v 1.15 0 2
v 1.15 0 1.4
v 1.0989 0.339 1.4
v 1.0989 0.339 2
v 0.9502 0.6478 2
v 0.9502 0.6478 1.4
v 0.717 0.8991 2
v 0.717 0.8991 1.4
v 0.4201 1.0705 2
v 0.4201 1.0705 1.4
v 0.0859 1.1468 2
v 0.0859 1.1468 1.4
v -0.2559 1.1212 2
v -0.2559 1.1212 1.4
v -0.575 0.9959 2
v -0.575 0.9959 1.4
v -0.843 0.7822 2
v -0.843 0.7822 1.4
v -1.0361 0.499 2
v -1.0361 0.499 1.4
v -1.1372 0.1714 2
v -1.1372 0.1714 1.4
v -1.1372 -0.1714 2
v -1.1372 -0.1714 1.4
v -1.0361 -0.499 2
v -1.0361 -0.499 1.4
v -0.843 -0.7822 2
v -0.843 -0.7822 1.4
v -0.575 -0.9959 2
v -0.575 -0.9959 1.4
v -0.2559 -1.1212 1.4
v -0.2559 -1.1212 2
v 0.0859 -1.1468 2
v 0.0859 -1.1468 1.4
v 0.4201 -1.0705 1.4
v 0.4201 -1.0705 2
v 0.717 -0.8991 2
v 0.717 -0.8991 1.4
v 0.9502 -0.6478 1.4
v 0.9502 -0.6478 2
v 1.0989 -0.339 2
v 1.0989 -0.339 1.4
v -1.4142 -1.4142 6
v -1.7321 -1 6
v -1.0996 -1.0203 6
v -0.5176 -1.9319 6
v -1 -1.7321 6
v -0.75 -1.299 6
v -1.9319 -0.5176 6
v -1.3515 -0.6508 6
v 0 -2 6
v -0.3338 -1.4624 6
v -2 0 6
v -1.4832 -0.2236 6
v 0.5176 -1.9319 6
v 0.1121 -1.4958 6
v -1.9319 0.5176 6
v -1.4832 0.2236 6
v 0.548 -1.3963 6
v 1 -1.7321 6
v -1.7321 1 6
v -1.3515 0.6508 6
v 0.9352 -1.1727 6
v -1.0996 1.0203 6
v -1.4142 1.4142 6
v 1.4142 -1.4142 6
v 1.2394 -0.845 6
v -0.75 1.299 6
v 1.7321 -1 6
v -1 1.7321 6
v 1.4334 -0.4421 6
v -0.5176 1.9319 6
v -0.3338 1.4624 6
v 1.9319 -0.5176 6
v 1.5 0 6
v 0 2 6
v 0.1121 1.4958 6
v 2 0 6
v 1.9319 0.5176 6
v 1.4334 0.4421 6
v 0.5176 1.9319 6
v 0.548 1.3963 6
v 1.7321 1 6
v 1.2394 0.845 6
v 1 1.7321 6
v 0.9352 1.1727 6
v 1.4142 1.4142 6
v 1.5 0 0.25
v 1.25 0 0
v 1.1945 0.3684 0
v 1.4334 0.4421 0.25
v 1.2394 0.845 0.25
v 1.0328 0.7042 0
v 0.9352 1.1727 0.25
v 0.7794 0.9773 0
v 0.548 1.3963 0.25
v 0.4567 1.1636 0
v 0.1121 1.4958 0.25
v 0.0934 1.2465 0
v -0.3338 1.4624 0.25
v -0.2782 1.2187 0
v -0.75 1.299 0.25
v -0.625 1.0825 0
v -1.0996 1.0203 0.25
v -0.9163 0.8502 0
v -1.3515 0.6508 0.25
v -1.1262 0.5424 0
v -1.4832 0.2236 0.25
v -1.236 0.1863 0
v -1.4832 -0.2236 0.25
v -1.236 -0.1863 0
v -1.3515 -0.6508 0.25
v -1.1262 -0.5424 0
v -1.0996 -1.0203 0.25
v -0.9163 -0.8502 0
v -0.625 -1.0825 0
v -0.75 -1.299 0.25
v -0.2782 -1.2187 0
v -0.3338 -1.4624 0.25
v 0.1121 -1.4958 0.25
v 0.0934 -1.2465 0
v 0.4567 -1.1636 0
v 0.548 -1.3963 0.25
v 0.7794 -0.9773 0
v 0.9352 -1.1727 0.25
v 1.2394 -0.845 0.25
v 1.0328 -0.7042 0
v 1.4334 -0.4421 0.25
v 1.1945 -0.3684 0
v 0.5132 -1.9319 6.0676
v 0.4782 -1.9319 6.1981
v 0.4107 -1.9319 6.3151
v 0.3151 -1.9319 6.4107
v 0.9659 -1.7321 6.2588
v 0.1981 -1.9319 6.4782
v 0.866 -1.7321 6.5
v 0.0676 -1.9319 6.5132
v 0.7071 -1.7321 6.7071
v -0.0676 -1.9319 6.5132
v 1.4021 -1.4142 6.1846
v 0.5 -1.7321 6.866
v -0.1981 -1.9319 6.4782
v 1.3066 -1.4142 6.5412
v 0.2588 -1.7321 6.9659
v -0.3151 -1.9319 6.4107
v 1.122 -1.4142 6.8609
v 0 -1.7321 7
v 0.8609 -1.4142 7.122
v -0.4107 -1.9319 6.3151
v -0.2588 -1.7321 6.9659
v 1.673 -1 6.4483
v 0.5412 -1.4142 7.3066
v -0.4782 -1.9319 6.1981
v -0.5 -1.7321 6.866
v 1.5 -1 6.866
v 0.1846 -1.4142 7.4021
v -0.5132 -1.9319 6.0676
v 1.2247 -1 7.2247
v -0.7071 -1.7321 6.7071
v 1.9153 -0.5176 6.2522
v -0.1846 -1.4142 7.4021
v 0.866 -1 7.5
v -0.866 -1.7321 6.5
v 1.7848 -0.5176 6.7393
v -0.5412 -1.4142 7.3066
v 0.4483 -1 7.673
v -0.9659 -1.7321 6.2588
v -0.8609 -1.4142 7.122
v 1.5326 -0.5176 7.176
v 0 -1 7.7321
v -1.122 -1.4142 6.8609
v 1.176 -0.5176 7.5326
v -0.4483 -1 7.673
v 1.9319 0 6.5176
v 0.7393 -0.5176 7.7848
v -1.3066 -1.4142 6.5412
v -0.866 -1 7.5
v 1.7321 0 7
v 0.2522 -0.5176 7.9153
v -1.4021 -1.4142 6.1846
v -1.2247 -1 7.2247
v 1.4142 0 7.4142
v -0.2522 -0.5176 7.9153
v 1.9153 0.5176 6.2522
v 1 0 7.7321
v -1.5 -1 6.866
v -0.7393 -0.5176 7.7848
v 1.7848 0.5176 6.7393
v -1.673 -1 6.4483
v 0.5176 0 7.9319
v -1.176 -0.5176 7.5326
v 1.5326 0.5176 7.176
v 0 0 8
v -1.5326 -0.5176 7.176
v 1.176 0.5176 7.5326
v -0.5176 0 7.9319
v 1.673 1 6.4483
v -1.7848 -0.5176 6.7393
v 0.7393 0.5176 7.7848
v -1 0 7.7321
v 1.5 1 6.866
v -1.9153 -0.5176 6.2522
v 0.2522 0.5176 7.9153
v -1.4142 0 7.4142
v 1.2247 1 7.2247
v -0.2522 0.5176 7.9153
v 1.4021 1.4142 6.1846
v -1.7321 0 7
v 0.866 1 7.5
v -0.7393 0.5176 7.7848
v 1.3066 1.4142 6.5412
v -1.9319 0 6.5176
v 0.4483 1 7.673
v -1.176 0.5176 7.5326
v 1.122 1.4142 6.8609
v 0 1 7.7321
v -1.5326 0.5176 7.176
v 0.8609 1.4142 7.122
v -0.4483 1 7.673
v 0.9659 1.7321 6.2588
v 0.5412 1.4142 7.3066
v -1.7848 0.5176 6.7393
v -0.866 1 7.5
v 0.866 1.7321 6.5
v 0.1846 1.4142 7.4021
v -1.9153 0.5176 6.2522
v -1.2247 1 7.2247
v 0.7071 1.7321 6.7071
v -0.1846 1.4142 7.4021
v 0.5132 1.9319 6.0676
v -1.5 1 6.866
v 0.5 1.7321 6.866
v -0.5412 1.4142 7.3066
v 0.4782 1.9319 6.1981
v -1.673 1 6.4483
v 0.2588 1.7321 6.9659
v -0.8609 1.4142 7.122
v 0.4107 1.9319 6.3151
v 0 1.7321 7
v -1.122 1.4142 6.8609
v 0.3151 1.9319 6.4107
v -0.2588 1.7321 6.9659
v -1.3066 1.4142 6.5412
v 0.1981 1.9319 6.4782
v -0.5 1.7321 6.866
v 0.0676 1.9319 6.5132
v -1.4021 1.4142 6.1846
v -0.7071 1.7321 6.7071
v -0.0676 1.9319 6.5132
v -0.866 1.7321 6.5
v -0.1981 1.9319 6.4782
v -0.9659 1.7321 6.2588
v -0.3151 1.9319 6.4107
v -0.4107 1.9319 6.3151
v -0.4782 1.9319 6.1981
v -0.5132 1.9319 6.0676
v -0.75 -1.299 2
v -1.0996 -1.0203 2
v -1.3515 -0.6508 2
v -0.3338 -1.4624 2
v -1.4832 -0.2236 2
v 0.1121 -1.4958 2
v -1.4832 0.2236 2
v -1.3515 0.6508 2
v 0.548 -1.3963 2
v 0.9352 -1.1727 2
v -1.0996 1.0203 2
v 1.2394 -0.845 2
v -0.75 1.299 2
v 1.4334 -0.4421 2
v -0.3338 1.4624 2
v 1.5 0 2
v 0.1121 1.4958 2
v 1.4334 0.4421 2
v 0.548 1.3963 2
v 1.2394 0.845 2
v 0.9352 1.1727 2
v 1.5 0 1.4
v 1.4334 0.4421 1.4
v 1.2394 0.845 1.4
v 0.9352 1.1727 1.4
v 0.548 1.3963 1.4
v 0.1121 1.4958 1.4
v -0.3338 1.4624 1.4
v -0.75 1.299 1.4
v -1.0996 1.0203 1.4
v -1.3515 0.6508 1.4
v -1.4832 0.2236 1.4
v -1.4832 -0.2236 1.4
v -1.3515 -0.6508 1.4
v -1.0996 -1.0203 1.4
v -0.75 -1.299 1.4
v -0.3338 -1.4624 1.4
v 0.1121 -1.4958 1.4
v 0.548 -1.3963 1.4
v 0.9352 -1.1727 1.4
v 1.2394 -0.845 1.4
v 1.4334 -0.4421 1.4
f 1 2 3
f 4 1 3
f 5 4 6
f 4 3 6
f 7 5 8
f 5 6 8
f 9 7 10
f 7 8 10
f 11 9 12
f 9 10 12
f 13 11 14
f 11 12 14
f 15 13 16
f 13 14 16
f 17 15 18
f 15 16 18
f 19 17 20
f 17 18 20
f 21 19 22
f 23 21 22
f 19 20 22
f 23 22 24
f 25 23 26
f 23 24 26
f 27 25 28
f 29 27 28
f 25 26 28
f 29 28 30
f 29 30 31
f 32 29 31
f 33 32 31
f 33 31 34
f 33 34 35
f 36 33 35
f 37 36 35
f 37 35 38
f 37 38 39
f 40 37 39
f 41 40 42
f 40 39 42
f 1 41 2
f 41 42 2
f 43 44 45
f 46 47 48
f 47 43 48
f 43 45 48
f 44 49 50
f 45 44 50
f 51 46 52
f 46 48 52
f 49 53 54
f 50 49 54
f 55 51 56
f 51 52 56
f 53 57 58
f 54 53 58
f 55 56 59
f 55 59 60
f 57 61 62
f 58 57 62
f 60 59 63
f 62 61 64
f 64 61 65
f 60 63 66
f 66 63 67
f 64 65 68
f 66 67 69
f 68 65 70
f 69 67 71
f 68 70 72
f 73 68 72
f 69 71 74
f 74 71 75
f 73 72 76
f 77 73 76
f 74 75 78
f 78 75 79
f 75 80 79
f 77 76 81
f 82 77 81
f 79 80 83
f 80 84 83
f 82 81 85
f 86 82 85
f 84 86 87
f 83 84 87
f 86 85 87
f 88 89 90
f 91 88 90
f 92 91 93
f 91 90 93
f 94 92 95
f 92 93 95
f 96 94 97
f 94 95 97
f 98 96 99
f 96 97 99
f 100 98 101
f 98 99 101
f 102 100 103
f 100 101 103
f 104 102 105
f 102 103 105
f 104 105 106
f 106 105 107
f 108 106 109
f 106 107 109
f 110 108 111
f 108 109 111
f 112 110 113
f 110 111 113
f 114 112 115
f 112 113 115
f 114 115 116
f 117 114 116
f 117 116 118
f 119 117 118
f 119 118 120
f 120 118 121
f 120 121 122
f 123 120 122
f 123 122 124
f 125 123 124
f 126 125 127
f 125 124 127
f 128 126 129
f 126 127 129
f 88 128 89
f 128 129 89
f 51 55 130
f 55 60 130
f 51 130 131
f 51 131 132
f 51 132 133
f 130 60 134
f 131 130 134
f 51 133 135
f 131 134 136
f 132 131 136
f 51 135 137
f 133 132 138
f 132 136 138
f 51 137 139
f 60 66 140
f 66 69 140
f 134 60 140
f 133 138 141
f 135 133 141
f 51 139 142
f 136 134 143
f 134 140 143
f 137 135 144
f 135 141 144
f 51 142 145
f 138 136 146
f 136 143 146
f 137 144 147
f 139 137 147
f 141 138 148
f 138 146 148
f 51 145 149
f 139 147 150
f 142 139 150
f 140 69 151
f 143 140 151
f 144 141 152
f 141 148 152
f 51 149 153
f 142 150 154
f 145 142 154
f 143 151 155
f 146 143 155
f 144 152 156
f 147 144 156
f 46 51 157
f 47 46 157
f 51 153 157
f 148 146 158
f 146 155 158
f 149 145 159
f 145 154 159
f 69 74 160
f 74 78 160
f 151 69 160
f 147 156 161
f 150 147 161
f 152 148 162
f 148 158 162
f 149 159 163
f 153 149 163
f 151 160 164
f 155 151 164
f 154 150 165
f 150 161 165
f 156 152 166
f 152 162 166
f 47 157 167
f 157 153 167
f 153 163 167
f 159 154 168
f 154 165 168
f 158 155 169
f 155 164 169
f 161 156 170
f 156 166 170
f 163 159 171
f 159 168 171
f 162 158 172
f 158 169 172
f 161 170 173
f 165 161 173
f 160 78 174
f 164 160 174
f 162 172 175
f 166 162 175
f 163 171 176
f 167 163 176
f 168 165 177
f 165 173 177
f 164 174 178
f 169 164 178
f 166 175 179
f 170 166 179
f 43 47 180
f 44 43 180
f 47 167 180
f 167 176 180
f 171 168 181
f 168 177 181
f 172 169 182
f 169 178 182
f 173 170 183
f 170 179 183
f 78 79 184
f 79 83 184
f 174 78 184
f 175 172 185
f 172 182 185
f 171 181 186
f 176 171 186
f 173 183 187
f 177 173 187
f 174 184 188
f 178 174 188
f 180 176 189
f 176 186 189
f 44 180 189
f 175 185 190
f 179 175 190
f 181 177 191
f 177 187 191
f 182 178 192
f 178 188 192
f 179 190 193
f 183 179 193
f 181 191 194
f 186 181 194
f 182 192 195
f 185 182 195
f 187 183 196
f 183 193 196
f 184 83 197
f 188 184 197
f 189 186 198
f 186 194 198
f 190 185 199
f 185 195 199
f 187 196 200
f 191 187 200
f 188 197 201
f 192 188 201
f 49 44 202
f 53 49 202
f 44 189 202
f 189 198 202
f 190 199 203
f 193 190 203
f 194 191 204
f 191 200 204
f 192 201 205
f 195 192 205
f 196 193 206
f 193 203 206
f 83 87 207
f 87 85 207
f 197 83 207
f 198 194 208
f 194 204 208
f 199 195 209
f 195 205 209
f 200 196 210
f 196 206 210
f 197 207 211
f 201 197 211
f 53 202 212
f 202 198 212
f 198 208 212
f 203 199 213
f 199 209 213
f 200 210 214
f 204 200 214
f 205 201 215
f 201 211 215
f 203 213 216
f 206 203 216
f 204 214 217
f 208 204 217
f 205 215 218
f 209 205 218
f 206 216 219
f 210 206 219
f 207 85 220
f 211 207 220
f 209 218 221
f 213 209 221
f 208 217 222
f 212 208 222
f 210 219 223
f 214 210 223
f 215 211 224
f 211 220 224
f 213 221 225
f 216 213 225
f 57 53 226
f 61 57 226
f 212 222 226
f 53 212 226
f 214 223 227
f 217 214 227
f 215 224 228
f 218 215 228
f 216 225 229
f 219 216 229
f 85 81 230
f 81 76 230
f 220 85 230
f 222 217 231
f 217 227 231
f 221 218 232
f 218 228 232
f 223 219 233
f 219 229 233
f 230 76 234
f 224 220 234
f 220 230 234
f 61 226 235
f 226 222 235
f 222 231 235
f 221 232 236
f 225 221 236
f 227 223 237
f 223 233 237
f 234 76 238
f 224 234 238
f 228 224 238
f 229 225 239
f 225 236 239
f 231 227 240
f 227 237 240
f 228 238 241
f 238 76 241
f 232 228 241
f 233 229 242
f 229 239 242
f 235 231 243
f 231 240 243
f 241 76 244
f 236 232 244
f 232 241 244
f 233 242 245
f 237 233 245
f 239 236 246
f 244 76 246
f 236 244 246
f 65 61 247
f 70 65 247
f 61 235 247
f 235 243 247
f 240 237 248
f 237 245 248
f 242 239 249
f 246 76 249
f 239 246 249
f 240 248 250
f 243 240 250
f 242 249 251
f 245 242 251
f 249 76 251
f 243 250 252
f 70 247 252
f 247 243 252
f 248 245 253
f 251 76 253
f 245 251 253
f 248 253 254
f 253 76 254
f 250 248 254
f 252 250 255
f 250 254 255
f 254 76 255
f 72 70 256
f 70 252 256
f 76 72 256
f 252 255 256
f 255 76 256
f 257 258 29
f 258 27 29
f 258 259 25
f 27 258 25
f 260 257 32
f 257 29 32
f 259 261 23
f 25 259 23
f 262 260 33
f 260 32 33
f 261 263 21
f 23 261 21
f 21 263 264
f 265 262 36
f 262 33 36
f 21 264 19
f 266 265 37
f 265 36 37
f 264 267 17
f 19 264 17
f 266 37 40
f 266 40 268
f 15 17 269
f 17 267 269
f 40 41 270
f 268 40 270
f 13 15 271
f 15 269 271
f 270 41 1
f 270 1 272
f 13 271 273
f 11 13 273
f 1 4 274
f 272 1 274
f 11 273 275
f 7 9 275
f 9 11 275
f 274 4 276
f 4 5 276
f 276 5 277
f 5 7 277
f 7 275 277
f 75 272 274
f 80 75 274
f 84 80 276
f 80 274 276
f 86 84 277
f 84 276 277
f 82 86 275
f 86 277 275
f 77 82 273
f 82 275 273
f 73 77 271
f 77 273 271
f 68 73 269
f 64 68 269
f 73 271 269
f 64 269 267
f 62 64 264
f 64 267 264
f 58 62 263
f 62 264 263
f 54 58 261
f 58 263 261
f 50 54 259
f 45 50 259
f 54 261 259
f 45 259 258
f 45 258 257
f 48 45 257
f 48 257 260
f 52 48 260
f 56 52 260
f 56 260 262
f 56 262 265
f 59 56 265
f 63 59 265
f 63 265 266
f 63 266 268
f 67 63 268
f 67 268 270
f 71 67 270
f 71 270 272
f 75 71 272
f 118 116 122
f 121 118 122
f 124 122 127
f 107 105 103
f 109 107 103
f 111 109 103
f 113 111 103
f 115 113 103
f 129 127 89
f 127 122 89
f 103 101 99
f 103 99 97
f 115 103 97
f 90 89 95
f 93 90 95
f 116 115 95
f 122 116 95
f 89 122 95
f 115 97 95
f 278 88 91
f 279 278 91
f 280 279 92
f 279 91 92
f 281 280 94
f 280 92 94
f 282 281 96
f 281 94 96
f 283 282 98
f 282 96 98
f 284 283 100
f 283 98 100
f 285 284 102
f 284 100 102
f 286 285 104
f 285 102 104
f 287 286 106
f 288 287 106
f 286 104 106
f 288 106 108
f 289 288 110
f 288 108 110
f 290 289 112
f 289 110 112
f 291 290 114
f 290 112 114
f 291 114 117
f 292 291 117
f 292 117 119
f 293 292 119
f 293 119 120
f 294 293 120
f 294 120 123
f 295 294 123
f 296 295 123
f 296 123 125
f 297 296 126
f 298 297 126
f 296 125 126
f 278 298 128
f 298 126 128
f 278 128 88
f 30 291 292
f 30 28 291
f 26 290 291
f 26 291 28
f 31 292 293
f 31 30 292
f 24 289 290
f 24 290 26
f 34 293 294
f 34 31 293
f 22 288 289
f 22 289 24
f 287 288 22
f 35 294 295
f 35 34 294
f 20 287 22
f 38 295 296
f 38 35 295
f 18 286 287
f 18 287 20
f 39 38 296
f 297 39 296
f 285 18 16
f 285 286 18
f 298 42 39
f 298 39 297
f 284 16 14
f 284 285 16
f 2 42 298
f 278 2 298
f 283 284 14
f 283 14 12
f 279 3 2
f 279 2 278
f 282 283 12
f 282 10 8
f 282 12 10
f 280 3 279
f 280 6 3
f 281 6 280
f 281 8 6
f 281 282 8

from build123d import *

# Parameters (mm, degrees)
SKETCH1_R           = 1.5
BOSS_EXTRUDE1_DEPTH = 1.4
SKETCH2_R           = 1.15
BOSS_EXTRUDE2_DEPTH = 0.6
SKETCH3_R           = 1.5
BOSS_EXTRUDE3_DEPTH = 4
REVOLVE1_ANGLE      = 180
CHAMFER1_SIZE       = 0.25


with BuildPart() as part:
    # Sketch1 → Boss-Extrude1 (new body)
    with BuildSketch(Plane.XY):
        Circle(SKETCH1_R)
    extrude(amount=BOSS_EXTRUDE1_DEPTH)

    # Sketch2 → Boss-Extrude2 (add)
    with BuildSketch(Plane.XY.offset(1.4)):
        Circle(SKETCH2_R)
    extrude(amount=BOSS_EXTRUDE2_DEPTH)

    # Sketch3 → Boss-Extrude3 (add)
    with BuildSketch(Plane.XY.offset(2)):
        Circle(SKETCH3_R)
    extrude(amount=BOSS_EXTRUDE3_DEPTH)

    # Sketch4 → Revolve1 (revolve)
    with BuildSketch(Plane.XY.offset(6)):
        with BuildLine():
            Line((0, 2), (0, -2))
            ThreePointArc((0, -2), (2, 0), (0, 2))
        make_face()
    revolve(axis=Axis((0, 2, 6), (0, -1, 0)), revolution_arc=REVOLVE1_ANGLE)

    # Chamfer1
    chamfer1_edges = [part.edges().sort_by_distance(p)[0] for p in [
        (-1.5, 0, 0),
    ]]
    chamfer(chamfer1_edges, length=CHAMFER1_SIZE)


solid = part.part
